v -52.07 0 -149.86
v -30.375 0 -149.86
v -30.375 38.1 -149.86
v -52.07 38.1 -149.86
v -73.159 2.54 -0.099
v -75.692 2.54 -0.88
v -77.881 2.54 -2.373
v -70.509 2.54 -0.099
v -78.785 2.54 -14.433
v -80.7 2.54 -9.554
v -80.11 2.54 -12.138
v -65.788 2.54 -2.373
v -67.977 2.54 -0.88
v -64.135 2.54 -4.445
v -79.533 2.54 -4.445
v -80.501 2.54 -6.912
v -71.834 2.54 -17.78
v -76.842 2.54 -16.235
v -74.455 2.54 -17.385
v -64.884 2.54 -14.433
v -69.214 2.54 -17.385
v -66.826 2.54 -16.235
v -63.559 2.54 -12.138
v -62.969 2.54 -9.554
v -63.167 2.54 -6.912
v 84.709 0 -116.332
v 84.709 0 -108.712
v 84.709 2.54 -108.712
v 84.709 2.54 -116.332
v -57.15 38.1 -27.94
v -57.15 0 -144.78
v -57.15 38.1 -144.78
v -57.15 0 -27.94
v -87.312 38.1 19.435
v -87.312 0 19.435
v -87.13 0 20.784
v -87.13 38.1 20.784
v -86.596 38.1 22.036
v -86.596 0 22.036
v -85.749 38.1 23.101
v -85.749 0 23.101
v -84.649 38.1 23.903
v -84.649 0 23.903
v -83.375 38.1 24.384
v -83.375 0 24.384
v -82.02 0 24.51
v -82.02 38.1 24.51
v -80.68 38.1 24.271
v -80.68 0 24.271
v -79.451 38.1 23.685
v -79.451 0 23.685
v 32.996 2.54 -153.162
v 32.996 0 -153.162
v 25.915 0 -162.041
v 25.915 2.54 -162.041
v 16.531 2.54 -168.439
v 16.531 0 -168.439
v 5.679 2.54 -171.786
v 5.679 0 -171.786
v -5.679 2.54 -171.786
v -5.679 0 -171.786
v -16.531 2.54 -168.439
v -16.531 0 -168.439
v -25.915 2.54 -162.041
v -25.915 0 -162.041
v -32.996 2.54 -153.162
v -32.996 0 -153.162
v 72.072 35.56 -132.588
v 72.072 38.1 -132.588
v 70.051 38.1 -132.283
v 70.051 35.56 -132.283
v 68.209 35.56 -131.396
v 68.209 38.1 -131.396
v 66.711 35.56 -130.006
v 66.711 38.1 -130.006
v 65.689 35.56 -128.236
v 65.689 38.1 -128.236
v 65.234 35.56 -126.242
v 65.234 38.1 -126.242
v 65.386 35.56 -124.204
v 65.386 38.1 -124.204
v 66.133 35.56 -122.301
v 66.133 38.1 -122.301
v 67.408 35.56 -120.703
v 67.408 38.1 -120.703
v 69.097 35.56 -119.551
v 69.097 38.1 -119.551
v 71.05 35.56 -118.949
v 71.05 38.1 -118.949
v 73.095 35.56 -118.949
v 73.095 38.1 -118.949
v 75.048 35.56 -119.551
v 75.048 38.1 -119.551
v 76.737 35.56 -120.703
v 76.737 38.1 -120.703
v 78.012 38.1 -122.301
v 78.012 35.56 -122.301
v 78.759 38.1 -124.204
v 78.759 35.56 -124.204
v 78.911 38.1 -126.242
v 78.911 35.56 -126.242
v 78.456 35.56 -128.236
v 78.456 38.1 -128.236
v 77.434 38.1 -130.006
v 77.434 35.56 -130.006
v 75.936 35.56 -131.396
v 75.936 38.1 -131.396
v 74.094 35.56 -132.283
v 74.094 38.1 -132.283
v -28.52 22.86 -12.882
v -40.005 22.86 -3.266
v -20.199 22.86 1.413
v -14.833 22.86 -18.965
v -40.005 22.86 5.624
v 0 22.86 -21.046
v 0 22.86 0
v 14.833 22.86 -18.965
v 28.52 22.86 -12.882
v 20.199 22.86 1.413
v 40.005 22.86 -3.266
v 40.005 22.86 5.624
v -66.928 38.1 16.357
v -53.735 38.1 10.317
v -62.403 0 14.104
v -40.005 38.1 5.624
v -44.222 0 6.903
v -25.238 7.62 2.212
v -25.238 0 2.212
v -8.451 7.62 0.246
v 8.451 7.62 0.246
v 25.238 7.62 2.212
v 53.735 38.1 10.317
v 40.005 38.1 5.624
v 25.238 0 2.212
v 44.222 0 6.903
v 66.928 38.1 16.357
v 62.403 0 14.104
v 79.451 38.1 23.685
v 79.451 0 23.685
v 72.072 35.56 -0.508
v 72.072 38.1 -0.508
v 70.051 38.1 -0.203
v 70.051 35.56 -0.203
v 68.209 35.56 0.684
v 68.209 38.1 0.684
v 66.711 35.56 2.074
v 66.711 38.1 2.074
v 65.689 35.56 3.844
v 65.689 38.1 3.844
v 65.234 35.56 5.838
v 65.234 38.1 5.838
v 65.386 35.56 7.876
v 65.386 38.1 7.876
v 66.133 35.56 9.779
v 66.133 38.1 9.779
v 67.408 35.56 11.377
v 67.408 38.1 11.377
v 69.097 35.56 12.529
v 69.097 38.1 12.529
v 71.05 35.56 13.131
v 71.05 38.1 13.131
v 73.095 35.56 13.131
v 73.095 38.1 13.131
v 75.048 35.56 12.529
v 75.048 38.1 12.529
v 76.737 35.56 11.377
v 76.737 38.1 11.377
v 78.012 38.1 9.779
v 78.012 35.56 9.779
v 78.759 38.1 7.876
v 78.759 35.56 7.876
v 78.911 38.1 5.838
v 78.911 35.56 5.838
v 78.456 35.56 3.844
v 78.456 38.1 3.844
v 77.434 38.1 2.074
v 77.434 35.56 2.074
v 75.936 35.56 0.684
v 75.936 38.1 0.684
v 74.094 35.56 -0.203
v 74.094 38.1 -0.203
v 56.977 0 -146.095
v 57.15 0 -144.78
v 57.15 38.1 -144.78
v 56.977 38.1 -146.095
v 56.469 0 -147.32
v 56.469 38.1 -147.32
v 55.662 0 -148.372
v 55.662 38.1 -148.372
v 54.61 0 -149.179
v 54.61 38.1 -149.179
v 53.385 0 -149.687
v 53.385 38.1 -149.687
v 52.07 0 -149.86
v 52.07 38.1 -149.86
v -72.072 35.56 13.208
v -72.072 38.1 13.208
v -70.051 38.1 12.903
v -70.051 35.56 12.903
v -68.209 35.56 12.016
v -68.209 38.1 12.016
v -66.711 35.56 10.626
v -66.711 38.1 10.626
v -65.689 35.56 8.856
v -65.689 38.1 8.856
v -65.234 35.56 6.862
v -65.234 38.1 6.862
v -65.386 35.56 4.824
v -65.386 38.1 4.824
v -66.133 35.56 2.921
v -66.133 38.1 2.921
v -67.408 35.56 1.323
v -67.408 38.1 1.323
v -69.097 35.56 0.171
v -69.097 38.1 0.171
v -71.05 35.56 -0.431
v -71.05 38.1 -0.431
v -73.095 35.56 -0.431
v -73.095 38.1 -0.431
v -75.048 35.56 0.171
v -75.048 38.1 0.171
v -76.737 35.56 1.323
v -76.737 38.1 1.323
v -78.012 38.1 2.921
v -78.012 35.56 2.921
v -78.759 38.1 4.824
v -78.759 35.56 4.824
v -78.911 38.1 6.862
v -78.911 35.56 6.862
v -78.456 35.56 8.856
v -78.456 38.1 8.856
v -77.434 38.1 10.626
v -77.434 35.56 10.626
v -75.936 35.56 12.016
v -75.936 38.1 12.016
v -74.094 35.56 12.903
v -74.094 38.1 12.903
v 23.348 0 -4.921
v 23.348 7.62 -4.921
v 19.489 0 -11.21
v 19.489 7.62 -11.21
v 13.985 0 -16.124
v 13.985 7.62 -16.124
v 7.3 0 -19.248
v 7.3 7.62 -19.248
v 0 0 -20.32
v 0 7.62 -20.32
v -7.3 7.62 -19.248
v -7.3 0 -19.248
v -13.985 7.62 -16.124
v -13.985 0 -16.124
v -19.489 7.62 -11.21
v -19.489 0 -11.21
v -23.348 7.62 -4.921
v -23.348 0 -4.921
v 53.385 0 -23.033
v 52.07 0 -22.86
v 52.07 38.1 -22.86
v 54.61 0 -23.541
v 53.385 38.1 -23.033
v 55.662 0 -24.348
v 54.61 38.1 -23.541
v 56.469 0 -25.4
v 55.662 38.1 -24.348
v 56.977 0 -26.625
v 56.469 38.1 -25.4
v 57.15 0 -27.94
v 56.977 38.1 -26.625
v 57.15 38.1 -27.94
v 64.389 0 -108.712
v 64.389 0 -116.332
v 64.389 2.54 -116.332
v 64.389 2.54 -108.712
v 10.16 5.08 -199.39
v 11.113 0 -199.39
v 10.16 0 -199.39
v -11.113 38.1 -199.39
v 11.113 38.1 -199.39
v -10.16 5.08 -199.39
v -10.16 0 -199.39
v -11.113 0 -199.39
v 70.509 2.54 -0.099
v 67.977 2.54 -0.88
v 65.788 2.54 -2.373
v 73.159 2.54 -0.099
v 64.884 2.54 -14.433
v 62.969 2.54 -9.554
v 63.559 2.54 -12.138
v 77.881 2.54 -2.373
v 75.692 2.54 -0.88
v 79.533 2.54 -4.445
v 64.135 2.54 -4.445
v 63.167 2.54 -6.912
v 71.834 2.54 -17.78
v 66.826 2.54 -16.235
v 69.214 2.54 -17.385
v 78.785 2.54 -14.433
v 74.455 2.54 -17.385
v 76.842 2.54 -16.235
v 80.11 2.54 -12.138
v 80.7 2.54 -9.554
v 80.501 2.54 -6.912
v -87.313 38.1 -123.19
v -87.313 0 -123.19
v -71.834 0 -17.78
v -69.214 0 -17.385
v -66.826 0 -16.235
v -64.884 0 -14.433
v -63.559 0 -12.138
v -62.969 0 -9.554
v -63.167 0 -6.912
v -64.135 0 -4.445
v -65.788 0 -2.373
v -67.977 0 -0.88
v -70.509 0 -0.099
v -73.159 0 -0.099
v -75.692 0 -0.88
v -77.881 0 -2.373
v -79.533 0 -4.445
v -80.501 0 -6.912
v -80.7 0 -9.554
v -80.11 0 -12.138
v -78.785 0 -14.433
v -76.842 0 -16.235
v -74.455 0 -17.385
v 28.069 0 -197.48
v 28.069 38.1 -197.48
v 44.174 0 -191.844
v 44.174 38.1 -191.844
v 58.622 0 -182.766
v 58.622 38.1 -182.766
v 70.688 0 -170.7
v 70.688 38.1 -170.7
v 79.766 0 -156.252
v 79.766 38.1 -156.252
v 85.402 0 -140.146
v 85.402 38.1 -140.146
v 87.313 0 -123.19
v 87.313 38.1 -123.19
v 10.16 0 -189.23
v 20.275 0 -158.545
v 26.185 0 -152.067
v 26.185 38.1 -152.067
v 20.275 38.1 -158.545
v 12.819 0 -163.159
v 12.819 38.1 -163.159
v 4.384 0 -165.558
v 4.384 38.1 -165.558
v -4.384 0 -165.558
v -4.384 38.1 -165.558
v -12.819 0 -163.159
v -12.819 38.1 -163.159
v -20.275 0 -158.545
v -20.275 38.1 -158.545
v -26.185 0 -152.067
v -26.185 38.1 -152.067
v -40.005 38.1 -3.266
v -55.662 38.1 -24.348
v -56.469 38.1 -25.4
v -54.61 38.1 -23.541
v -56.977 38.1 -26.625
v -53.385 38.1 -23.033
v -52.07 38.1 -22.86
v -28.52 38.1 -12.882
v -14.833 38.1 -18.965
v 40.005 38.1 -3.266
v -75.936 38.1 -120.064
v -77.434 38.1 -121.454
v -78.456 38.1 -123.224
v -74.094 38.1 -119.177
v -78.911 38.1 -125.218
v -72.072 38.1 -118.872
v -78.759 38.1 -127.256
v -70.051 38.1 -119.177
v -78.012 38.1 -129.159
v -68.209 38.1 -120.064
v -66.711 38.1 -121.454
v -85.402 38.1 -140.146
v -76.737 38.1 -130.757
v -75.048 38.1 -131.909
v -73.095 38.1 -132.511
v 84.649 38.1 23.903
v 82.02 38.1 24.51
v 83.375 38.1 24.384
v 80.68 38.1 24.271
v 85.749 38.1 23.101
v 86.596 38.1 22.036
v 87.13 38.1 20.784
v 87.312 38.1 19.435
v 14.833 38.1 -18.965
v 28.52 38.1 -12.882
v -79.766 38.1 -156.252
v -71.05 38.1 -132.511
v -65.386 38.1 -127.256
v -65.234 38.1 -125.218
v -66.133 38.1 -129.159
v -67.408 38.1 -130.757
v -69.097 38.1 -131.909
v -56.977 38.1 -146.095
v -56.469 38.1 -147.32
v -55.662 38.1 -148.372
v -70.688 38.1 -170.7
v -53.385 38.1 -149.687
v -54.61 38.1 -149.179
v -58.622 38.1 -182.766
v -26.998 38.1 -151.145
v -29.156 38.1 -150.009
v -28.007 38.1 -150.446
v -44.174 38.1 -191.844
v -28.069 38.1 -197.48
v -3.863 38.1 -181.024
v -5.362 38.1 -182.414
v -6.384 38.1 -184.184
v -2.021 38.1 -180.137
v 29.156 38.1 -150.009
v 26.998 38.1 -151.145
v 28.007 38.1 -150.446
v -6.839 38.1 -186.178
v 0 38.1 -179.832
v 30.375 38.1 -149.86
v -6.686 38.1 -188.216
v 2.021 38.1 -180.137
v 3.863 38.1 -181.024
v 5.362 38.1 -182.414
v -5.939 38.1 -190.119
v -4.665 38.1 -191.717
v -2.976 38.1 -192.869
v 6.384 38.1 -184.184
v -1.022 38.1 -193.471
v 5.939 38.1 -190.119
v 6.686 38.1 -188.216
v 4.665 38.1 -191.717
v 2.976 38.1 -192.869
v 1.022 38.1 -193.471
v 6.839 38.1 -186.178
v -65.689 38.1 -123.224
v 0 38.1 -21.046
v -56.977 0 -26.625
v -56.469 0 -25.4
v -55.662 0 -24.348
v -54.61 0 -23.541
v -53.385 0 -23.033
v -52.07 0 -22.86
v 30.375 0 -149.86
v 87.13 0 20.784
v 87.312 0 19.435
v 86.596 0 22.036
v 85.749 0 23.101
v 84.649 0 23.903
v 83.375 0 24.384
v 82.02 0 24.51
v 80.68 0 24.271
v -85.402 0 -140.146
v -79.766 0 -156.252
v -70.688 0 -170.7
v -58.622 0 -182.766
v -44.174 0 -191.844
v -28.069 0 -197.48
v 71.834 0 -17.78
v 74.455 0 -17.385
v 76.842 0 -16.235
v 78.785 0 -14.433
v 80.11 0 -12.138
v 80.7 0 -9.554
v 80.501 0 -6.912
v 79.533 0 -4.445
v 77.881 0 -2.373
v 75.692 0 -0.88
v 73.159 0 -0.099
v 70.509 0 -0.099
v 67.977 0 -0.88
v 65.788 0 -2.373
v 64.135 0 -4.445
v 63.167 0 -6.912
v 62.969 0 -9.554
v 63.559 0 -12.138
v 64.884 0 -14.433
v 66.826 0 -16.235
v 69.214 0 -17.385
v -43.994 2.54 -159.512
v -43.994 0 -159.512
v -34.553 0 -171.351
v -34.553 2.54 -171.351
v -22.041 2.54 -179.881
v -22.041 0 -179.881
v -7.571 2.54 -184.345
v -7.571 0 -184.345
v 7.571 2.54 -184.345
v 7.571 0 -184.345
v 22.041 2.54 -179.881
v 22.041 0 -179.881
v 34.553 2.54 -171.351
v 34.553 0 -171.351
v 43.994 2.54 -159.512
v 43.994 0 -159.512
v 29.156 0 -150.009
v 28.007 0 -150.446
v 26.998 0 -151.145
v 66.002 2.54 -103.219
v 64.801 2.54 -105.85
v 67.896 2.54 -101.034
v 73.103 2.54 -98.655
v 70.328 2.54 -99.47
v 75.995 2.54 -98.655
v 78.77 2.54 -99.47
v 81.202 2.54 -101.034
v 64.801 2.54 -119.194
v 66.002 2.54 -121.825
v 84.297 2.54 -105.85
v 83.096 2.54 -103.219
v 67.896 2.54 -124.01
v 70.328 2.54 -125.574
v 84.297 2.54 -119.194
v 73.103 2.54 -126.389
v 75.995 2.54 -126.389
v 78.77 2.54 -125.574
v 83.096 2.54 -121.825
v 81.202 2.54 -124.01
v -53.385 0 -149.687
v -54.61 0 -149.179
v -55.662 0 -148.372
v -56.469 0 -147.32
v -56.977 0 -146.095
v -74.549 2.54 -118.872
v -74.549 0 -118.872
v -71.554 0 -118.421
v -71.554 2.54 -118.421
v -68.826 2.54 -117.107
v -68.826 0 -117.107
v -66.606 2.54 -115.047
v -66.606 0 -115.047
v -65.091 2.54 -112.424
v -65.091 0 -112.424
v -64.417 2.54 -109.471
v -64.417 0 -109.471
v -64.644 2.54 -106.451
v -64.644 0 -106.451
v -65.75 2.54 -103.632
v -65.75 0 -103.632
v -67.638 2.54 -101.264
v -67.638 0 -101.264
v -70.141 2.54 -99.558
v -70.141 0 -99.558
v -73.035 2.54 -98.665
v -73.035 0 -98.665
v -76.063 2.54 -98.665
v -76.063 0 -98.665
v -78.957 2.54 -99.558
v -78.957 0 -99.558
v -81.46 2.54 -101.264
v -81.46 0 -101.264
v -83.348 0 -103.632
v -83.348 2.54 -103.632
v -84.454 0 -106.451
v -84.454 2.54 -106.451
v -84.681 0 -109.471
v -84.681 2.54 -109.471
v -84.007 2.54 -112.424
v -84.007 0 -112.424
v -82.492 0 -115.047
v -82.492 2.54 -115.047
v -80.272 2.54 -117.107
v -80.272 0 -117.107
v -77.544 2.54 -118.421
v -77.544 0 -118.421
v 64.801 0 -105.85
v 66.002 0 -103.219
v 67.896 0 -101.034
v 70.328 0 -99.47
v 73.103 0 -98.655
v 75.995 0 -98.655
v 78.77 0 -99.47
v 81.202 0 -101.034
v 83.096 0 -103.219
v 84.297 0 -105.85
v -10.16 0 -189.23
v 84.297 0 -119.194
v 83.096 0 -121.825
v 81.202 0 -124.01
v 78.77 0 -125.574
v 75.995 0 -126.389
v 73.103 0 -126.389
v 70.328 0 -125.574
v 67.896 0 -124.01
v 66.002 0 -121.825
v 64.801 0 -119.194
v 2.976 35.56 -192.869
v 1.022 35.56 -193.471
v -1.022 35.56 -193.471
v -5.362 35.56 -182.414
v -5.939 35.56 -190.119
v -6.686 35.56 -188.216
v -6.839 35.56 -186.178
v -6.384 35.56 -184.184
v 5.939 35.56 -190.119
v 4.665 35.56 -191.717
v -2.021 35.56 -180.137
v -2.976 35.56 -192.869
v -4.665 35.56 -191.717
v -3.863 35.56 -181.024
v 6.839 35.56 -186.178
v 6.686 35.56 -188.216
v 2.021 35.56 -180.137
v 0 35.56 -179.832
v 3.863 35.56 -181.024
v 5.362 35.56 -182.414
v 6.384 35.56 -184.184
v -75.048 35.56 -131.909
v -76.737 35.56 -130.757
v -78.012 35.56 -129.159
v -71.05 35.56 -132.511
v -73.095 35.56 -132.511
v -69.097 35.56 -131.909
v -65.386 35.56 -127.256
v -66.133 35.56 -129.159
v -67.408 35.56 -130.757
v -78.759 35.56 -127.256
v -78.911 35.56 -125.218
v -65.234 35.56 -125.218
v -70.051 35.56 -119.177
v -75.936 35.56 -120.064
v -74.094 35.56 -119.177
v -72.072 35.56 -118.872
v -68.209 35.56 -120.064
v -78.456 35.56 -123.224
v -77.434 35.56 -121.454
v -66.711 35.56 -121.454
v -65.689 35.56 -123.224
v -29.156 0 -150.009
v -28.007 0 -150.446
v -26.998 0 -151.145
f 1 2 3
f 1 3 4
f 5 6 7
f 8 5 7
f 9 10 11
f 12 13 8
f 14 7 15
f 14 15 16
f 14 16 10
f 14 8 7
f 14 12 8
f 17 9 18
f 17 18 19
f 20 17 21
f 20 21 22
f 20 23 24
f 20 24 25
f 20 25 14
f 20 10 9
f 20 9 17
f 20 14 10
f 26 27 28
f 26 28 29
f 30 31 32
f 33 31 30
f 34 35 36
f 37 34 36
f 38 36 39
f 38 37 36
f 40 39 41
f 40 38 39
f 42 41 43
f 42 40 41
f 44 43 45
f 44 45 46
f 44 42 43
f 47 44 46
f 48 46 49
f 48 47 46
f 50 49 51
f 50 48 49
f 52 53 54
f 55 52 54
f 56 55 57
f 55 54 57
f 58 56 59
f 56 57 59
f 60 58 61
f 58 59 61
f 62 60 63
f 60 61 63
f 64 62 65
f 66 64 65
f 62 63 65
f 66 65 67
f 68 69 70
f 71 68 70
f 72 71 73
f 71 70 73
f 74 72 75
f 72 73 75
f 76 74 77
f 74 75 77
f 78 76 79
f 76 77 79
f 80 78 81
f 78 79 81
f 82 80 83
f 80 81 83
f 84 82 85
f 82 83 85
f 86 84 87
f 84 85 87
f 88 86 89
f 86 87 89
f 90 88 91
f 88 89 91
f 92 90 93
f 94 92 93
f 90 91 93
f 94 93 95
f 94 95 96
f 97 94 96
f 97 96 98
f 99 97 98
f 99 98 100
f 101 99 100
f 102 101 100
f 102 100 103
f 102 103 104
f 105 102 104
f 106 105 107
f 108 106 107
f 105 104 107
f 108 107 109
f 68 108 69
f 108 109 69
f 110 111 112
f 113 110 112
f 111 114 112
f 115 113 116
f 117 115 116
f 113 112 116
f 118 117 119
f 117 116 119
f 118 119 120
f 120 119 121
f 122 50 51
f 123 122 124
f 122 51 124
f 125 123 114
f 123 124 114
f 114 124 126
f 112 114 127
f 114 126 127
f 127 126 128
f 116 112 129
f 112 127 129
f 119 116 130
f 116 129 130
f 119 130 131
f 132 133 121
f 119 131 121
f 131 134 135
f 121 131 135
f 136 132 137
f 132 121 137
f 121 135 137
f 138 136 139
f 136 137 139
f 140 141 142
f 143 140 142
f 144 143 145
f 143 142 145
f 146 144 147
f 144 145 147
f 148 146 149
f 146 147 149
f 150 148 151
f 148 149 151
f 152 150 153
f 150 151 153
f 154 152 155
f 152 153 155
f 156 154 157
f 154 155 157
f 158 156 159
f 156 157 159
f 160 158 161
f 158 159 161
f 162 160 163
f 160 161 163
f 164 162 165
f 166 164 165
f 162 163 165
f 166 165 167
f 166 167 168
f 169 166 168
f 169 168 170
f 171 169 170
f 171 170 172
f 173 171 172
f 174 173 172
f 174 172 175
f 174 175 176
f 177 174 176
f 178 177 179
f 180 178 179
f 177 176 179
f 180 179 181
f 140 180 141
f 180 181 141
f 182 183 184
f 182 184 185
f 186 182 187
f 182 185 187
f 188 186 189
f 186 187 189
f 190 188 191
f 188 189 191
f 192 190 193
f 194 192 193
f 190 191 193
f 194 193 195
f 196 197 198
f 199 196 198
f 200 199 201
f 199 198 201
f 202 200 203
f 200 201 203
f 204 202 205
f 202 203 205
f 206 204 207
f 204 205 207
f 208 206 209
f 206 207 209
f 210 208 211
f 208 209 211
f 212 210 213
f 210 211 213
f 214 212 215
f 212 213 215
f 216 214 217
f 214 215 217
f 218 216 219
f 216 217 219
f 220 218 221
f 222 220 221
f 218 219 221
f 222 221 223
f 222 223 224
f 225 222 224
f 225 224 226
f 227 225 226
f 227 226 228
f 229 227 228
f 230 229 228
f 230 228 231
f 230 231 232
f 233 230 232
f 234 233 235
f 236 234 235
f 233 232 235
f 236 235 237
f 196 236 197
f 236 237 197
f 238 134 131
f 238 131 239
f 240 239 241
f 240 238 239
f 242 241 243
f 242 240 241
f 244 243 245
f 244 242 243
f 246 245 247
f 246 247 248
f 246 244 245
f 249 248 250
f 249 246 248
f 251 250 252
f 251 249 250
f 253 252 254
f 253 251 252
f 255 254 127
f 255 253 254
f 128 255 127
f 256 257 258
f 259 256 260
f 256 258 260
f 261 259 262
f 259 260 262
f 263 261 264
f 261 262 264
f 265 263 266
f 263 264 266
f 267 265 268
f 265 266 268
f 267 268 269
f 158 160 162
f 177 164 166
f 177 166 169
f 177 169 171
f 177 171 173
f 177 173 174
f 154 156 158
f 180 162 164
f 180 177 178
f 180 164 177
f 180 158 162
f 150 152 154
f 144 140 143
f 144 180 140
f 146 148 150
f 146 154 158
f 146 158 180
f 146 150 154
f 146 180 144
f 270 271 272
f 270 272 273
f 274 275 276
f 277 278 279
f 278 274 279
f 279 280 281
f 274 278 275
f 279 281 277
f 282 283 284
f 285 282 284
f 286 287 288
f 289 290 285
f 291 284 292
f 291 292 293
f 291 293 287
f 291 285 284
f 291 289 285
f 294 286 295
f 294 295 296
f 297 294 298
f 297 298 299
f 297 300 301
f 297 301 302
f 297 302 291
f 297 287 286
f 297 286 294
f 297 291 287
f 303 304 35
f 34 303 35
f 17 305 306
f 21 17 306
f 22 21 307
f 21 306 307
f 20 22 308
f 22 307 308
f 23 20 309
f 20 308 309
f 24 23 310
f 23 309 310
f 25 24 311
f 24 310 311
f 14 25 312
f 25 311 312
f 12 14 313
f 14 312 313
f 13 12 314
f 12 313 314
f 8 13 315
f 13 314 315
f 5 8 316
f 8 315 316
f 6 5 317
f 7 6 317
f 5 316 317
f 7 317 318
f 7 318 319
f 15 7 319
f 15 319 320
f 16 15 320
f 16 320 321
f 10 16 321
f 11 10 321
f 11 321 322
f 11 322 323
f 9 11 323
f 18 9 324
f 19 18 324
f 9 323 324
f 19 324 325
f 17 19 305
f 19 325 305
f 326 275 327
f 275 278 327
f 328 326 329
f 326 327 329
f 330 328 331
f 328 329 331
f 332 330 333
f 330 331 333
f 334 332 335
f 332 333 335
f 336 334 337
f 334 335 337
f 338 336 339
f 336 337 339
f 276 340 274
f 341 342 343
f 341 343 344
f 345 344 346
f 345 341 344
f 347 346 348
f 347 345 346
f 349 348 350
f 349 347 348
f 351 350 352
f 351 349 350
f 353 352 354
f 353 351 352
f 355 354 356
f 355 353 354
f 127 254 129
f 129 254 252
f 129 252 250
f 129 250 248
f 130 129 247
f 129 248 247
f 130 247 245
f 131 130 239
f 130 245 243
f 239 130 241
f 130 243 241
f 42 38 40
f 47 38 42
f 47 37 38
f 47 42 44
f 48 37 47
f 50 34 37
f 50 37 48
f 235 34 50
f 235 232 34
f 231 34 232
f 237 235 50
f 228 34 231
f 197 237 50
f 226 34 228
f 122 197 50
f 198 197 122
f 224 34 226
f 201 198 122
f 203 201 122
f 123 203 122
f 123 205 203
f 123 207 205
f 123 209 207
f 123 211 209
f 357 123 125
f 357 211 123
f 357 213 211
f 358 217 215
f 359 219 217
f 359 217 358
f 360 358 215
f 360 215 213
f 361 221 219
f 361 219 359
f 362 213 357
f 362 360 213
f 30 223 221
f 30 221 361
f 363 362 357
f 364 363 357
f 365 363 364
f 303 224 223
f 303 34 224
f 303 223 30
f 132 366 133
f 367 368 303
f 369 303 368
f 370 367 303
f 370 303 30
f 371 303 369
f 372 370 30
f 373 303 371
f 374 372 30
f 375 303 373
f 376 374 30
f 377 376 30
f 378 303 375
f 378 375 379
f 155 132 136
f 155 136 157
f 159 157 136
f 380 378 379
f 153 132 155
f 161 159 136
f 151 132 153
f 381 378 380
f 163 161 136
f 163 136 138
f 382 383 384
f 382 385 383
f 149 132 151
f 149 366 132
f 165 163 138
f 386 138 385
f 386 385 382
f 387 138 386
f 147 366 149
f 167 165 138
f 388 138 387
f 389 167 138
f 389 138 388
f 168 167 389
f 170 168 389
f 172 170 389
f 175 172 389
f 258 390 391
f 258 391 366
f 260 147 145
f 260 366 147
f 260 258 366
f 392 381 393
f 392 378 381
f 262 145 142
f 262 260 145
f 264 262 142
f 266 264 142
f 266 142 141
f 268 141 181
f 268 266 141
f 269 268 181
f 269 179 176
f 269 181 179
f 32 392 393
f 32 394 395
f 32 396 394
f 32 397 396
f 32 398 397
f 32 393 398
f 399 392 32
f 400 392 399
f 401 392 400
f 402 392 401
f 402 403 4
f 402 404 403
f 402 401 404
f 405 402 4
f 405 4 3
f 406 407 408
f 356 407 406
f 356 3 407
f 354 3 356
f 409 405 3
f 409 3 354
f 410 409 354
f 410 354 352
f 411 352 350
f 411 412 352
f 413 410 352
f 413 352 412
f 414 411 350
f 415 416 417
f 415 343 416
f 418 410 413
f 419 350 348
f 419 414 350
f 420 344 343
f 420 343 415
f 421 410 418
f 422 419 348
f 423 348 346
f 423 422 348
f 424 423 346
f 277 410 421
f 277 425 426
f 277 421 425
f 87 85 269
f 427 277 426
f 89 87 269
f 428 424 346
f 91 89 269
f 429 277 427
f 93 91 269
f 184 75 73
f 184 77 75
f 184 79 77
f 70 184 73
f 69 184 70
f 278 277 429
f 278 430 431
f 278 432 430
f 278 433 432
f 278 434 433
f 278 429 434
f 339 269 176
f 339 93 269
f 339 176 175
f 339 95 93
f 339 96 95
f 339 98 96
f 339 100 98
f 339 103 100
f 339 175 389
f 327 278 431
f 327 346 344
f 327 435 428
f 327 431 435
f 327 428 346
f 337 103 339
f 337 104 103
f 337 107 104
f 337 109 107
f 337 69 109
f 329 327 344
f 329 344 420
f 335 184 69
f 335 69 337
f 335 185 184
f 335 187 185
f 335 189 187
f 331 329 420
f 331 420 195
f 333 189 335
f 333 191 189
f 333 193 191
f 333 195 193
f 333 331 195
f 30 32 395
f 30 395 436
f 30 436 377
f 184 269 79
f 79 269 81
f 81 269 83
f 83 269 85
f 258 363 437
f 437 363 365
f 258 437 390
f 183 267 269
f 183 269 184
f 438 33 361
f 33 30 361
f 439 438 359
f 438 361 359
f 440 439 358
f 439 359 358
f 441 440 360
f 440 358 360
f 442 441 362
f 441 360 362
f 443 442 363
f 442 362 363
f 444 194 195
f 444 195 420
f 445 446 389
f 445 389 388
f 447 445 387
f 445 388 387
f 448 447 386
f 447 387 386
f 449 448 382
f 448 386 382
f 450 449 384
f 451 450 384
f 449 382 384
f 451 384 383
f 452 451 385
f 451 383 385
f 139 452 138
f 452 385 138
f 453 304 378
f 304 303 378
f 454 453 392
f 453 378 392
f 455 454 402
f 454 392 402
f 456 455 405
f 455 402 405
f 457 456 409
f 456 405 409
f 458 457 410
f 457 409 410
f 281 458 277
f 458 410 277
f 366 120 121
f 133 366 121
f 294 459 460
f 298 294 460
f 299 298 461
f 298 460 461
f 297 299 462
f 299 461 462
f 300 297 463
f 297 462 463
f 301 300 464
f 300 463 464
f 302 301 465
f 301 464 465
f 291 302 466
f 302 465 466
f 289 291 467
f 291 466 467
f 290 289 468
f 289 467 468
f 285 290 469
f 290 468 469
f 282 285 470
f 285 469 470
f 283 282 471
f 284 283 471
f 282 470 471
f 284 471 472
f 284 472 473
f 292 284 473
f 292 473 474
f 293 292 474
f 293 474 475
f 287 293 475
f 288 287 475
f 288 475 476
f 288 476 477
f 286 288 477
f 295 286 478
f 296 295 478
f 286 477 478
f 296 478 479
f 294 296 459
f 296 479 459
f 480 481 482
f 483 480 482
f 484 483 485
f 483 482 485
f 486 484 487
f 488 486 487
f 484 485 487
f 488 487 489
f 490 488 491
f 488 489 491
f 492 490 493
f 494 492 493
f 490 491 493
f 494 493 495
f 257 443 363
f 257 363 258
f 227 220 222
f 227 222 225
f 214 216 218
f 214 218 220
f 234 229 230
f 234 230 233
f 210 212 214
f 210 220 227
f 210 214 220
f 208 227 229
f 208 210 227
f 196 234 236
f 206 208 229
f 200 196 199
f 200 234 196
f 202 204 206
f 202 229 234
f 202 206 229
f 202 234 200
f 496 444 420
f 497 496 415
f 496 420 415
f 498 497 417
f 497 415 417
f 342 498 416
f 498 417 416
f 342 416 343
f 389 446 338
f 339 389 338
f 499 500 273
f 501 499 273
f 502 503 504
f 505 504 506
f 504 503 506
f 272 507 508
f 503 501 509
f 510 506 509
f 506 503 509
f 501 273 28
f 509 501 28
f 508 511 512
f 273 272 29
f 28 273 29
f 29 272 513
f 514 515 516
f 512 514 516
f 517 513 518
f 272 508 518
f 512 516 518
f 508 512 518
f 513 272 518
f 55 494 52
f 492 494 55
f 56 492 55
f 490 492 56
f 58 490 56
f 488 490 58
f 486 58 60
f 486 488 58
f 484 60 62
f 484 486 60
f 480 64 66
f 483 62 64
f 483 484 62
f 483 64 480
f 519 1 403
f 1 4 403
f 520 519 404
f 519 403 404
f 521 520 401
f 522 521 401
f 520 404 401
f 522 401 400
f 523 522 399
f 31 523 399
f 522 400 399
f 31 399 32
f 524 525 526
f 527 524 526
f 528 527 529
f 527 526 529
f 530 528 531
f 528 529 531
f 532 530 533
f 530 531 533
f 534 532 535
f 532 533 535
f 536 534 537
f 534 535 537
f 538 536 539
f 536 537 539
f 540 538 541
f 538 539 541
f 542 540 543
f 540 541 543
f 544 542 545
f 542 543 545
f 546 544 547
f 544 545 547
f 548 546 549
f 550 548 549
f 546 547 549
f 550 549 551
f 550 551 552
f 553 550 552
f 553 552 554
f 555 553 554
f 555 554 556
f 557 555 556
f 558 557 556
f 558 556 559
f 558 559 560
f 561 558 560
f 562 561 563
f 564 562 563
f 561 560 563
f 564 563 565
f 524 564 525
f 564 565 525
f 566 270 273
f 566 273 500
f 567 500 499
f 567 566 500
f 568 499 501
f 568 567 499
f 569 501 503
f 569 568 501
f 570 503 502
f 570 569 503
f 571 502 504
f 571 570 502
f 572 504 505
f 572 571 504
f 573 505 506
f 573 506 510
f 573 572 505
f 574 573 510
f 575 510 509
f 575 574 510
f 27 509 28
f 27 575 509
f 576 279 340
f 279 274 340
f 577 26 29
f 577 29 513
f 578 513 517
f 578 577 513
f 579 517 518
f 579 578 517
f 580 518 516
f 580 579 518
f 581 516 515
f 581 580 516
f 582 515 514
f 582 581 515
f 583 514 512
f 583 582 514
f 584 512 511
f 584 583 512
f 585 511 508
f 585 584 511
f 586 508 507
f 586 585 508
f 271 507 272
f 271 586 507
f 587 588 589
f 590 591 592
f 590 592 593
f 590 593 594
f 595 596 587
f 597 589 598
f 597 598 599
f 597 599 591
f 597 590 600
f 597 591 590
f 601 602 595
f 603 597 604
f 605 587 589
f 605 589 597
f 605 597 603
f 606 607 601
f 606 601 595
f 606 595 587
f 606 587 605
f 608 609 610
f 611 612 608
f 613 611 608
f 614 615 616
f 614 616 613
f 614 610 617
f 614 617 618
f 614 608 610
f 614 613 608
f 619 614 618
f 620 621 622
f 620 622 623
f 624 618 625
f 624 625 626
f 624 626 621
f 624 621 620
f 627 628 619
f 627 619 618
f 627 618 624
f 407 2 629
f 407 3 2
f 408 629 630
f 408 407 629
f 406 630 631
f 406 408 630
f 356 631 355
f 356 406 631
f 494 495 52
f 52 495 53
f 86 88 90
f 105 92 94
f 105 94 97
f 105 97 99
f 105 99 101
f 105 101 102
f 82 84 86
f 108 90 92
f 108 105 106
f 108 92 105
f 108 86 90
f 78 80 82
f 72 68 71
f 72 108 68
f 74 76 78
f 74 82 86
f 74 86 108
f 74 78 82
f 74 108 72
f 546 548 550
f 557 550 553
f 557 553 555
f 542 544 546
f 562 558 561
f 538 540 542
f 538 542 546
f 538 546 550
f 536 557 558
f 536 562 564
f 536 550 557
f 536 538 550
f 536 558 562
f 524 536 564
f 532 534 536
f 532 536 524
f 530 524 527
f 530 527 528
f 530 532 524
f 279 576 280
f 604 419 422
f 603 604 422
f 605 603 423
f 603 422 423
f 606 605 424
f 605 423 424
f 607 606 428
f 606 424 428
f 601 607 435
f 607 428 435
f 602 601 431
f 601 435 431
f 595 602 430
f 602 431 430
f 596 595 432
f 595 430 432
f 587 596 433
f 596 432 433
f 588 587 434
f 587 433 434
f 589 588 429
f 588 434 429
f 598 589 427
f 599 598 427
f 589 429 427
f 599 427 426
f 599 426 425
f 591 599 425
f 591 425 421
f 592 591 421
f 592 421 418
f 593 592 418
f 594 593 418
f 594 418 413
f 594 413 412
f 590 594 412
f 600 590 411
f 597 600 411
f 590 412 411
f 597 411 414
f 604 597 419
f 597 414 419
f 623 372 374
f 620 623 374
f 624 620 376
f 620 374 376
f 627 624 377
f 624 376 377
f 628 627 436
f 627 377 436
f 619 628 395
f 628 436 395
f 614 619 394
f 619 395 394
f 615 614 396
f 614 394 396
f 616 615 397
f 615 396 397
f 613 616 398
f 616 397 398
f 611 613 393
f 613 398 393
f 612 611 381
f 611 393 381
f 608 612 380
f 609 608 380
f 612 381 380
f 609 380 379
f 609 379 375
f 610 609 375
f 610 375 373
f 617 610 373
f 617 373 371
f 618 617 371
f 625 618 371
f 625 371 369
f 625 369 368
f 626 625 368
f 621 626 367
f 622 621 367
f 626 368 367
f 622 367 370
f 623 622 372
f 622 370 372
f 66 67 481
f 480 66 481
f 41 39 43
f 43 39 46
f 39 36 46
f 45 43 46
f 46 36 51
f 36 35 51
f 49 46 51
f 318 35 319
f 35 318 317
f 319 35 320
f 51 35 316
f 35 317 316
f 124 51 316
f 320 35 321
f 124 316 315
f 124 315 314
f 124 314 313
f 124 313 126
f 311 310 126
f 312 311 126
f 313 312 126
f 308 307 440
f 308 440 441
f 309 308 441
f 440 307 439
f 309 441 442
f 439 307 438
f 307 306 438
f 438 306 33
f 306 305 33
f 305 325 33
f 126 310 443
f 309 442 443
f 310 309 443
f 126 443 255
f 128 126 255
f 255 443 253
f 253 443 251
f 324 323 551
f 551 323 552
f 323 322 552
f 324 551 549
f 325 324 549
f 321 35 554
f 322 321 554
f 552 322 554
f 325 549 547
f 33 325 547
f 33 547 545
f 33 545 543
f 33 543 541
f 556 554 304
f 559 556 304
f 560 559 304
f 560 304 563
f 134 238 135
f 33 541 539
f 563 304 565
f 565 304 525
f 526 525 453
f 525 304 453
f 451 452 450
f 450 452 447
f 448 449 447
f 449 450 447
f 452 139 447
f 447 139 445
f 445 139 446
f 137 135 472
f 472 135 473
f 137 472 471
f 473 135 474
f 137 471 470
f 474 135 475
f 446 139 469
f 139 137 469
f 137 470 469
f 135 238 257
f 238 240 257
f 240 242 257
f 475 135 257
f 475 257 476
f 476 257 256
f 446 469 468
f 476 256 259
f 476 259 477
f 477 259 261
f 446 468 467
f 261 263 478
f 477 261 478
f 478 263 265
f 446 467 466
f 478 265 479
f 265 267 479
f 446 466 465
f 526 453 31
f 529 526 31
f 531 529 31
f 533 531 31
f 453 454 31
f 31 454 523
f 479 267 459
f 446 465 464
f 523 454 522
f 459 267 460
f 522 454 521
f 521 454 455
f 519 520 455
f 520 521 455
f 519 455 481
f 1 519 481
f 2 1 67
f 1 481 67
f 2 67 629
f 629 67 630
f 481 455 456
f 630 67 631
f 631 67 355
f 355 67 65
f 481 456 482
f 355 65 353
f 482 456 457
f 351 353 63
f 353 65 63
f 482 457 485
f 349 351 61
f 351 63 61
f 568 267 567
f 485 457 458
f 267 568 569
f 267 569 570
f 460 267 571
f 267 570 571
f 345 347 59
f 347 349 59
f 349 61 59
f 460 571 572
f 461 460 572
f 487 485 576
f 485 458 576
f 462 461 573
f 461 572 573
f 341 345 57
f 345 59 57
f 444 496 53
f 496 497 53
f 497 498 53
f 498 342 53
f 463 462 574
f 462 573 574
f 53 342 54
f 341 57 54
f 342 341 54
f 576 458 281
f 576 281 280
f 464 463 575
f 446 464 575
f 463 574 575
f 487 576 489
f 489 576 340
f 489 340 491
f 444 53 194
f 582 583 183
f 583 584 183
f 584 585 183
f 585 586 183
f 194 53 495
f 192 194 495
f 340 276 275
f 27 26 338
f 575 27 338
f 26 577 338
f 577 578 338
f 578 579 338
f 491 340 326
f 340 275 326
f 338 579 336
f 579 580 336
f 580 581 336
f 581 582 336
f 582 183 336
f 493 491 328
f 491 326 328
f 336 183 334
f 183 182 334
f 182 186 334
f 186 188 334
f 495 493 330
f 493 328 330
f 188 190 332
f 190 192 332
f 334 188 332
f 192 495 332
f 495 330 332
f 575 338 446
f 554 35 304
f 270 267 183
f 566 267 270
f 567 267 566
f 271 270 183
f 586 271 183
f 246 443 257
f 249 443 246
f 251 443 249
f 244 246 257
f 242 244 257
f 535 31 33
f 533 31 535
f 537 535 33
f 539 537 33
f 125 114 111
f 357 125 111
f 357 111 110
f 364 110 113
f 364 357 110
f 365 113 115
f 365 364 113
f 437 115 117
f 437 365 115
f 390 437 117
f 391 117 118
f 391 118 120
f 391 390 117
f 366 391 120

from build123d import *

# Parameters (mm, degrees)
BASE_DEPTH                      = 38.1
SKETCH2_R                       = 8.89
SKETCH2_R_2                     = 10.16
COFFEE_MAKER_FEET_CUTOUTS_DEPTH = 2.54
ASYMMETRIC_FOOT_SLOT_DEPTH      = 2.54
FRONT_START                     = -38.1
SKETCH11_R                      = 25.4
FRONT_CUTOUT_DEPTH              = 7.62
FILLET1_R                       = 76.2
DRIP_START                      = -38.1
DRIP_TRAY_CUTOUT_DEPTH          = 15.24
SKETCH5_R                       = 6.858
FEET_PADS_DEPTH                 = 2.54
CENTER_CUTOUT_DEPTH             = 221.978403371
FILLET2_R                       = 5.08
FILLET4_R                       = 5.08
EASY_PRINTER_RELEASE_TAB_DEPTH  = 10.16


with BuildPart() as part:
    # Sketch1 → Base (new body)
    with BuildSketch(Plane(origin=(0, 0, 0), x_dir=(1, 0, 0), z_dir=(0, 1, 0))):
        with BuildLine():
            Line((-87.3125, 199.39), (-87.3125, -29.21))
            ThreePointArc((-87.3125, -29.21), (0, 0), (87.3125, -29.21))
            Line((87.3125, -29.21), (87.3125, 199.39))
            Line((87.3125, 199.39), (-87.3125, 199.39))
        make_face()
    extrude(amount=BASE_DEPTH)

    # Sketch2 → Coffee Maker Feet Cutouts (cut)
    with BuildSketch(Plane(origin=(0, 0, 0), x_dir=(-1, 0, 0), z_dir=(0, -1, 0))):
        with Locations(Location((71.834375, 8.89, 0), (0, 0, 90))):
            Circle(SKETCH2_R)
        with Locations(Location((74.549, 108.712, 0), (0, 0, 90))):
            Circle(SKETCH2_R_2)
        with Locations(Location((-74.549, 108.712, 0), (0, 0, 90))):
            Circle(SKETCH2_R_2)
        with Locations(Location((-71.834375, 8.89, 0), (0, 0, 90))):
            Circle(SKETCH2_R)
        with BuildLine():
            Line((-43.994090512, 159.512), (-32.995567884, 153.162))
            ThreePointArc((-32.995567884, 153.162), (0, 172.212), (32.995567884, 153.162))
            Line((32.995567884, 153.162), (43.994090512, 159.512))
            ThreePointArc((43.994090512, 159.512), (0, 184.912), (-43.994090512, 159.512))
        make_face()
    extrude(amount=-COFFEE_MAKER_FEET_CUTOUTS_DEPTH, mode=Mode.SUBTRACT)

    # Sketch10 → Asymmetric Foot Slot (cut)
    with BuildSketch(Plane(origin=(0, 0, 0), x_dir=(-1, 0, 0), z_dir=(0, -1, 0))):
        with BuildLine():
            Line((-84.709, 108.712), (-84.709, 116.332))
            ThreePointArc((-84.709, 116.332), (-74.549, 126.492), (-64.389, 116.332))
            Line((-64.389, 116.332), (-64.389, 108.712))
            ThreePointArc((-64.389, 108.712), (-74.549, 98.552), (-84.709, 108.712))
        make_face()
    extrude(amount=-ASYMMETRIC_FOOT_SLOT_DEPTH, mode=Mode.SUBTRACT)

    # Sketch11 → Front cutout (cut)
    with BuildSketch(Plane(origin=(0, 38.1, 0), x_dir=(1, 0, 0), z_dir=(0, 1, 0)).offset(FRONT_START)):
        with Locations((0, -5.08)):
            Circle(SKETCH11_R)
    extrude(amount=FRONT_CUTOUT_DEPTH, mode=Mode.SUBTRACT)

    # Fillet1
    fillet1_edges = [part.edges().sort_by_distance(p)[0] for p in [
        (87.3125, 19.05, -199.39),
        (-87.3125, 19.05, -199.39),
    ]]
    fillet(fillet1_edges, radius=FILLET1_R)

    # Sketch4 → Drip Tray Cutout (cut)
    with BuildSketch(Plane.XZ.offset(DRIP_START)):
        with BuildLine():
            Line((40.005, -3.26616737), (40.005, 5.62383263))
            Line((40.005, 5.62383263), (-40.005, 5.62383263))
            Line((-40.005, 5.62383263), (-40.005, -3.26616737))
            ThreePointArc((-40.005, -3.26616737), (0, -21.04616737), (40.005, -3.26616737))
        make_face()
    extrude(amount=DRIP_TRAY_CUTOUT_DEPTH, mode=Mode.SUBTRACT)

    # Sketch5 → Feet Pads (cut)
    with BuildSketch(Plane(origin=(0, 38.1, 0), x_dir=(1, 0, 0), z_dir=(0, 1, 0))):
        with Locations(Location((-72.0725, -6.35, 0), (0, 0, 270))):
            Circle(SKETCH5_R)
        with Locations(Location((-72.0725, 125.73, 0), (0, 0, 270))):
            Circle(SKETCH5_R)
        with Locations(Location((0, 186.69, 0), (0, 0, 270))):
            Circle(SKETCH5_R)
        with Locations(Location((72.0725, 125.73, 0), (0, 0, 90))):
            Circle(SKETCH5_R)
        with Locations(Location((72.0725, -6.35, 0), (0, 0, 90))):
            Circle(SKETCH5_R)
    extrude(amount=-FEET_PADS_DEPTH, mode=Mode.SUBTRACT)

    # Sketch6 → Center cutout (cut, through all)
    with BuildSketch(Plane(origin=(0, 0, 0), x_dir=(-1, 0, 0), z_dir=(0, -1, 0))):
        with BuildLine():
            Line((27.569240033, 149.86), (57.15, 149.86))
            Line((57.15, 149.86), (57.15, 22.86))
            Line((57.15, 22.86), (-57.15, 22.86))
            Line((-57.15, 22.86), (-57.15, 149.86))
            Line((-57.15, 149.86), (-27.569240033, 149.86))
            ThreePointArc((-27.569240033, 149.86), (0, 165.862), (27.569240033, 149.86))
        make_face()
    extrude(amount=-CENTER_CUTOUT_DEPTH, mode=Mode.SUBTRACT)

    # Fillet2
    fillet2_edges = [part.edges().sort_by_distance(p)[0] for p in [
        (57.15, 19.05, -22.86),
        (57.15, 19.05, -149.86),
        (27.569240033, 19.05, -149.86),
        (-27.569240033, 19.05, -149.86),
        (-57.15, 19.05, -149.86),
        (-57.15, 19.05, -22.86),
    ]]
    fillet(fillet2_edges, radius=FILLET2_R)

    # Fillet4
    fillet4_edges = [part.edges().sort_by_distance(p)[0] for p in [
        (87.3125, 19.05, 29.21),
        (-87.3125, 19.05, 29.21),
    ]]
    fillet(fillet4_edges, radius=FILLET4_R)

    # Sketch9 → Easy-Printer-Release-Tab (cut, symmetric)
    with BuildSketch(Plane(origin=(0, 0, 0), x_dir=(0, 0, -1), z_dir=(1, 0, 0))):
        Polygon((199.39, 5.08), (189.23, 0), (199.39, 0), align=None)
    extrude(amount=EASY_PRINTER_RELEASE_TAB_DEPTH, both=True, mode=Mode.SUBTRACT)


solid = part.part
